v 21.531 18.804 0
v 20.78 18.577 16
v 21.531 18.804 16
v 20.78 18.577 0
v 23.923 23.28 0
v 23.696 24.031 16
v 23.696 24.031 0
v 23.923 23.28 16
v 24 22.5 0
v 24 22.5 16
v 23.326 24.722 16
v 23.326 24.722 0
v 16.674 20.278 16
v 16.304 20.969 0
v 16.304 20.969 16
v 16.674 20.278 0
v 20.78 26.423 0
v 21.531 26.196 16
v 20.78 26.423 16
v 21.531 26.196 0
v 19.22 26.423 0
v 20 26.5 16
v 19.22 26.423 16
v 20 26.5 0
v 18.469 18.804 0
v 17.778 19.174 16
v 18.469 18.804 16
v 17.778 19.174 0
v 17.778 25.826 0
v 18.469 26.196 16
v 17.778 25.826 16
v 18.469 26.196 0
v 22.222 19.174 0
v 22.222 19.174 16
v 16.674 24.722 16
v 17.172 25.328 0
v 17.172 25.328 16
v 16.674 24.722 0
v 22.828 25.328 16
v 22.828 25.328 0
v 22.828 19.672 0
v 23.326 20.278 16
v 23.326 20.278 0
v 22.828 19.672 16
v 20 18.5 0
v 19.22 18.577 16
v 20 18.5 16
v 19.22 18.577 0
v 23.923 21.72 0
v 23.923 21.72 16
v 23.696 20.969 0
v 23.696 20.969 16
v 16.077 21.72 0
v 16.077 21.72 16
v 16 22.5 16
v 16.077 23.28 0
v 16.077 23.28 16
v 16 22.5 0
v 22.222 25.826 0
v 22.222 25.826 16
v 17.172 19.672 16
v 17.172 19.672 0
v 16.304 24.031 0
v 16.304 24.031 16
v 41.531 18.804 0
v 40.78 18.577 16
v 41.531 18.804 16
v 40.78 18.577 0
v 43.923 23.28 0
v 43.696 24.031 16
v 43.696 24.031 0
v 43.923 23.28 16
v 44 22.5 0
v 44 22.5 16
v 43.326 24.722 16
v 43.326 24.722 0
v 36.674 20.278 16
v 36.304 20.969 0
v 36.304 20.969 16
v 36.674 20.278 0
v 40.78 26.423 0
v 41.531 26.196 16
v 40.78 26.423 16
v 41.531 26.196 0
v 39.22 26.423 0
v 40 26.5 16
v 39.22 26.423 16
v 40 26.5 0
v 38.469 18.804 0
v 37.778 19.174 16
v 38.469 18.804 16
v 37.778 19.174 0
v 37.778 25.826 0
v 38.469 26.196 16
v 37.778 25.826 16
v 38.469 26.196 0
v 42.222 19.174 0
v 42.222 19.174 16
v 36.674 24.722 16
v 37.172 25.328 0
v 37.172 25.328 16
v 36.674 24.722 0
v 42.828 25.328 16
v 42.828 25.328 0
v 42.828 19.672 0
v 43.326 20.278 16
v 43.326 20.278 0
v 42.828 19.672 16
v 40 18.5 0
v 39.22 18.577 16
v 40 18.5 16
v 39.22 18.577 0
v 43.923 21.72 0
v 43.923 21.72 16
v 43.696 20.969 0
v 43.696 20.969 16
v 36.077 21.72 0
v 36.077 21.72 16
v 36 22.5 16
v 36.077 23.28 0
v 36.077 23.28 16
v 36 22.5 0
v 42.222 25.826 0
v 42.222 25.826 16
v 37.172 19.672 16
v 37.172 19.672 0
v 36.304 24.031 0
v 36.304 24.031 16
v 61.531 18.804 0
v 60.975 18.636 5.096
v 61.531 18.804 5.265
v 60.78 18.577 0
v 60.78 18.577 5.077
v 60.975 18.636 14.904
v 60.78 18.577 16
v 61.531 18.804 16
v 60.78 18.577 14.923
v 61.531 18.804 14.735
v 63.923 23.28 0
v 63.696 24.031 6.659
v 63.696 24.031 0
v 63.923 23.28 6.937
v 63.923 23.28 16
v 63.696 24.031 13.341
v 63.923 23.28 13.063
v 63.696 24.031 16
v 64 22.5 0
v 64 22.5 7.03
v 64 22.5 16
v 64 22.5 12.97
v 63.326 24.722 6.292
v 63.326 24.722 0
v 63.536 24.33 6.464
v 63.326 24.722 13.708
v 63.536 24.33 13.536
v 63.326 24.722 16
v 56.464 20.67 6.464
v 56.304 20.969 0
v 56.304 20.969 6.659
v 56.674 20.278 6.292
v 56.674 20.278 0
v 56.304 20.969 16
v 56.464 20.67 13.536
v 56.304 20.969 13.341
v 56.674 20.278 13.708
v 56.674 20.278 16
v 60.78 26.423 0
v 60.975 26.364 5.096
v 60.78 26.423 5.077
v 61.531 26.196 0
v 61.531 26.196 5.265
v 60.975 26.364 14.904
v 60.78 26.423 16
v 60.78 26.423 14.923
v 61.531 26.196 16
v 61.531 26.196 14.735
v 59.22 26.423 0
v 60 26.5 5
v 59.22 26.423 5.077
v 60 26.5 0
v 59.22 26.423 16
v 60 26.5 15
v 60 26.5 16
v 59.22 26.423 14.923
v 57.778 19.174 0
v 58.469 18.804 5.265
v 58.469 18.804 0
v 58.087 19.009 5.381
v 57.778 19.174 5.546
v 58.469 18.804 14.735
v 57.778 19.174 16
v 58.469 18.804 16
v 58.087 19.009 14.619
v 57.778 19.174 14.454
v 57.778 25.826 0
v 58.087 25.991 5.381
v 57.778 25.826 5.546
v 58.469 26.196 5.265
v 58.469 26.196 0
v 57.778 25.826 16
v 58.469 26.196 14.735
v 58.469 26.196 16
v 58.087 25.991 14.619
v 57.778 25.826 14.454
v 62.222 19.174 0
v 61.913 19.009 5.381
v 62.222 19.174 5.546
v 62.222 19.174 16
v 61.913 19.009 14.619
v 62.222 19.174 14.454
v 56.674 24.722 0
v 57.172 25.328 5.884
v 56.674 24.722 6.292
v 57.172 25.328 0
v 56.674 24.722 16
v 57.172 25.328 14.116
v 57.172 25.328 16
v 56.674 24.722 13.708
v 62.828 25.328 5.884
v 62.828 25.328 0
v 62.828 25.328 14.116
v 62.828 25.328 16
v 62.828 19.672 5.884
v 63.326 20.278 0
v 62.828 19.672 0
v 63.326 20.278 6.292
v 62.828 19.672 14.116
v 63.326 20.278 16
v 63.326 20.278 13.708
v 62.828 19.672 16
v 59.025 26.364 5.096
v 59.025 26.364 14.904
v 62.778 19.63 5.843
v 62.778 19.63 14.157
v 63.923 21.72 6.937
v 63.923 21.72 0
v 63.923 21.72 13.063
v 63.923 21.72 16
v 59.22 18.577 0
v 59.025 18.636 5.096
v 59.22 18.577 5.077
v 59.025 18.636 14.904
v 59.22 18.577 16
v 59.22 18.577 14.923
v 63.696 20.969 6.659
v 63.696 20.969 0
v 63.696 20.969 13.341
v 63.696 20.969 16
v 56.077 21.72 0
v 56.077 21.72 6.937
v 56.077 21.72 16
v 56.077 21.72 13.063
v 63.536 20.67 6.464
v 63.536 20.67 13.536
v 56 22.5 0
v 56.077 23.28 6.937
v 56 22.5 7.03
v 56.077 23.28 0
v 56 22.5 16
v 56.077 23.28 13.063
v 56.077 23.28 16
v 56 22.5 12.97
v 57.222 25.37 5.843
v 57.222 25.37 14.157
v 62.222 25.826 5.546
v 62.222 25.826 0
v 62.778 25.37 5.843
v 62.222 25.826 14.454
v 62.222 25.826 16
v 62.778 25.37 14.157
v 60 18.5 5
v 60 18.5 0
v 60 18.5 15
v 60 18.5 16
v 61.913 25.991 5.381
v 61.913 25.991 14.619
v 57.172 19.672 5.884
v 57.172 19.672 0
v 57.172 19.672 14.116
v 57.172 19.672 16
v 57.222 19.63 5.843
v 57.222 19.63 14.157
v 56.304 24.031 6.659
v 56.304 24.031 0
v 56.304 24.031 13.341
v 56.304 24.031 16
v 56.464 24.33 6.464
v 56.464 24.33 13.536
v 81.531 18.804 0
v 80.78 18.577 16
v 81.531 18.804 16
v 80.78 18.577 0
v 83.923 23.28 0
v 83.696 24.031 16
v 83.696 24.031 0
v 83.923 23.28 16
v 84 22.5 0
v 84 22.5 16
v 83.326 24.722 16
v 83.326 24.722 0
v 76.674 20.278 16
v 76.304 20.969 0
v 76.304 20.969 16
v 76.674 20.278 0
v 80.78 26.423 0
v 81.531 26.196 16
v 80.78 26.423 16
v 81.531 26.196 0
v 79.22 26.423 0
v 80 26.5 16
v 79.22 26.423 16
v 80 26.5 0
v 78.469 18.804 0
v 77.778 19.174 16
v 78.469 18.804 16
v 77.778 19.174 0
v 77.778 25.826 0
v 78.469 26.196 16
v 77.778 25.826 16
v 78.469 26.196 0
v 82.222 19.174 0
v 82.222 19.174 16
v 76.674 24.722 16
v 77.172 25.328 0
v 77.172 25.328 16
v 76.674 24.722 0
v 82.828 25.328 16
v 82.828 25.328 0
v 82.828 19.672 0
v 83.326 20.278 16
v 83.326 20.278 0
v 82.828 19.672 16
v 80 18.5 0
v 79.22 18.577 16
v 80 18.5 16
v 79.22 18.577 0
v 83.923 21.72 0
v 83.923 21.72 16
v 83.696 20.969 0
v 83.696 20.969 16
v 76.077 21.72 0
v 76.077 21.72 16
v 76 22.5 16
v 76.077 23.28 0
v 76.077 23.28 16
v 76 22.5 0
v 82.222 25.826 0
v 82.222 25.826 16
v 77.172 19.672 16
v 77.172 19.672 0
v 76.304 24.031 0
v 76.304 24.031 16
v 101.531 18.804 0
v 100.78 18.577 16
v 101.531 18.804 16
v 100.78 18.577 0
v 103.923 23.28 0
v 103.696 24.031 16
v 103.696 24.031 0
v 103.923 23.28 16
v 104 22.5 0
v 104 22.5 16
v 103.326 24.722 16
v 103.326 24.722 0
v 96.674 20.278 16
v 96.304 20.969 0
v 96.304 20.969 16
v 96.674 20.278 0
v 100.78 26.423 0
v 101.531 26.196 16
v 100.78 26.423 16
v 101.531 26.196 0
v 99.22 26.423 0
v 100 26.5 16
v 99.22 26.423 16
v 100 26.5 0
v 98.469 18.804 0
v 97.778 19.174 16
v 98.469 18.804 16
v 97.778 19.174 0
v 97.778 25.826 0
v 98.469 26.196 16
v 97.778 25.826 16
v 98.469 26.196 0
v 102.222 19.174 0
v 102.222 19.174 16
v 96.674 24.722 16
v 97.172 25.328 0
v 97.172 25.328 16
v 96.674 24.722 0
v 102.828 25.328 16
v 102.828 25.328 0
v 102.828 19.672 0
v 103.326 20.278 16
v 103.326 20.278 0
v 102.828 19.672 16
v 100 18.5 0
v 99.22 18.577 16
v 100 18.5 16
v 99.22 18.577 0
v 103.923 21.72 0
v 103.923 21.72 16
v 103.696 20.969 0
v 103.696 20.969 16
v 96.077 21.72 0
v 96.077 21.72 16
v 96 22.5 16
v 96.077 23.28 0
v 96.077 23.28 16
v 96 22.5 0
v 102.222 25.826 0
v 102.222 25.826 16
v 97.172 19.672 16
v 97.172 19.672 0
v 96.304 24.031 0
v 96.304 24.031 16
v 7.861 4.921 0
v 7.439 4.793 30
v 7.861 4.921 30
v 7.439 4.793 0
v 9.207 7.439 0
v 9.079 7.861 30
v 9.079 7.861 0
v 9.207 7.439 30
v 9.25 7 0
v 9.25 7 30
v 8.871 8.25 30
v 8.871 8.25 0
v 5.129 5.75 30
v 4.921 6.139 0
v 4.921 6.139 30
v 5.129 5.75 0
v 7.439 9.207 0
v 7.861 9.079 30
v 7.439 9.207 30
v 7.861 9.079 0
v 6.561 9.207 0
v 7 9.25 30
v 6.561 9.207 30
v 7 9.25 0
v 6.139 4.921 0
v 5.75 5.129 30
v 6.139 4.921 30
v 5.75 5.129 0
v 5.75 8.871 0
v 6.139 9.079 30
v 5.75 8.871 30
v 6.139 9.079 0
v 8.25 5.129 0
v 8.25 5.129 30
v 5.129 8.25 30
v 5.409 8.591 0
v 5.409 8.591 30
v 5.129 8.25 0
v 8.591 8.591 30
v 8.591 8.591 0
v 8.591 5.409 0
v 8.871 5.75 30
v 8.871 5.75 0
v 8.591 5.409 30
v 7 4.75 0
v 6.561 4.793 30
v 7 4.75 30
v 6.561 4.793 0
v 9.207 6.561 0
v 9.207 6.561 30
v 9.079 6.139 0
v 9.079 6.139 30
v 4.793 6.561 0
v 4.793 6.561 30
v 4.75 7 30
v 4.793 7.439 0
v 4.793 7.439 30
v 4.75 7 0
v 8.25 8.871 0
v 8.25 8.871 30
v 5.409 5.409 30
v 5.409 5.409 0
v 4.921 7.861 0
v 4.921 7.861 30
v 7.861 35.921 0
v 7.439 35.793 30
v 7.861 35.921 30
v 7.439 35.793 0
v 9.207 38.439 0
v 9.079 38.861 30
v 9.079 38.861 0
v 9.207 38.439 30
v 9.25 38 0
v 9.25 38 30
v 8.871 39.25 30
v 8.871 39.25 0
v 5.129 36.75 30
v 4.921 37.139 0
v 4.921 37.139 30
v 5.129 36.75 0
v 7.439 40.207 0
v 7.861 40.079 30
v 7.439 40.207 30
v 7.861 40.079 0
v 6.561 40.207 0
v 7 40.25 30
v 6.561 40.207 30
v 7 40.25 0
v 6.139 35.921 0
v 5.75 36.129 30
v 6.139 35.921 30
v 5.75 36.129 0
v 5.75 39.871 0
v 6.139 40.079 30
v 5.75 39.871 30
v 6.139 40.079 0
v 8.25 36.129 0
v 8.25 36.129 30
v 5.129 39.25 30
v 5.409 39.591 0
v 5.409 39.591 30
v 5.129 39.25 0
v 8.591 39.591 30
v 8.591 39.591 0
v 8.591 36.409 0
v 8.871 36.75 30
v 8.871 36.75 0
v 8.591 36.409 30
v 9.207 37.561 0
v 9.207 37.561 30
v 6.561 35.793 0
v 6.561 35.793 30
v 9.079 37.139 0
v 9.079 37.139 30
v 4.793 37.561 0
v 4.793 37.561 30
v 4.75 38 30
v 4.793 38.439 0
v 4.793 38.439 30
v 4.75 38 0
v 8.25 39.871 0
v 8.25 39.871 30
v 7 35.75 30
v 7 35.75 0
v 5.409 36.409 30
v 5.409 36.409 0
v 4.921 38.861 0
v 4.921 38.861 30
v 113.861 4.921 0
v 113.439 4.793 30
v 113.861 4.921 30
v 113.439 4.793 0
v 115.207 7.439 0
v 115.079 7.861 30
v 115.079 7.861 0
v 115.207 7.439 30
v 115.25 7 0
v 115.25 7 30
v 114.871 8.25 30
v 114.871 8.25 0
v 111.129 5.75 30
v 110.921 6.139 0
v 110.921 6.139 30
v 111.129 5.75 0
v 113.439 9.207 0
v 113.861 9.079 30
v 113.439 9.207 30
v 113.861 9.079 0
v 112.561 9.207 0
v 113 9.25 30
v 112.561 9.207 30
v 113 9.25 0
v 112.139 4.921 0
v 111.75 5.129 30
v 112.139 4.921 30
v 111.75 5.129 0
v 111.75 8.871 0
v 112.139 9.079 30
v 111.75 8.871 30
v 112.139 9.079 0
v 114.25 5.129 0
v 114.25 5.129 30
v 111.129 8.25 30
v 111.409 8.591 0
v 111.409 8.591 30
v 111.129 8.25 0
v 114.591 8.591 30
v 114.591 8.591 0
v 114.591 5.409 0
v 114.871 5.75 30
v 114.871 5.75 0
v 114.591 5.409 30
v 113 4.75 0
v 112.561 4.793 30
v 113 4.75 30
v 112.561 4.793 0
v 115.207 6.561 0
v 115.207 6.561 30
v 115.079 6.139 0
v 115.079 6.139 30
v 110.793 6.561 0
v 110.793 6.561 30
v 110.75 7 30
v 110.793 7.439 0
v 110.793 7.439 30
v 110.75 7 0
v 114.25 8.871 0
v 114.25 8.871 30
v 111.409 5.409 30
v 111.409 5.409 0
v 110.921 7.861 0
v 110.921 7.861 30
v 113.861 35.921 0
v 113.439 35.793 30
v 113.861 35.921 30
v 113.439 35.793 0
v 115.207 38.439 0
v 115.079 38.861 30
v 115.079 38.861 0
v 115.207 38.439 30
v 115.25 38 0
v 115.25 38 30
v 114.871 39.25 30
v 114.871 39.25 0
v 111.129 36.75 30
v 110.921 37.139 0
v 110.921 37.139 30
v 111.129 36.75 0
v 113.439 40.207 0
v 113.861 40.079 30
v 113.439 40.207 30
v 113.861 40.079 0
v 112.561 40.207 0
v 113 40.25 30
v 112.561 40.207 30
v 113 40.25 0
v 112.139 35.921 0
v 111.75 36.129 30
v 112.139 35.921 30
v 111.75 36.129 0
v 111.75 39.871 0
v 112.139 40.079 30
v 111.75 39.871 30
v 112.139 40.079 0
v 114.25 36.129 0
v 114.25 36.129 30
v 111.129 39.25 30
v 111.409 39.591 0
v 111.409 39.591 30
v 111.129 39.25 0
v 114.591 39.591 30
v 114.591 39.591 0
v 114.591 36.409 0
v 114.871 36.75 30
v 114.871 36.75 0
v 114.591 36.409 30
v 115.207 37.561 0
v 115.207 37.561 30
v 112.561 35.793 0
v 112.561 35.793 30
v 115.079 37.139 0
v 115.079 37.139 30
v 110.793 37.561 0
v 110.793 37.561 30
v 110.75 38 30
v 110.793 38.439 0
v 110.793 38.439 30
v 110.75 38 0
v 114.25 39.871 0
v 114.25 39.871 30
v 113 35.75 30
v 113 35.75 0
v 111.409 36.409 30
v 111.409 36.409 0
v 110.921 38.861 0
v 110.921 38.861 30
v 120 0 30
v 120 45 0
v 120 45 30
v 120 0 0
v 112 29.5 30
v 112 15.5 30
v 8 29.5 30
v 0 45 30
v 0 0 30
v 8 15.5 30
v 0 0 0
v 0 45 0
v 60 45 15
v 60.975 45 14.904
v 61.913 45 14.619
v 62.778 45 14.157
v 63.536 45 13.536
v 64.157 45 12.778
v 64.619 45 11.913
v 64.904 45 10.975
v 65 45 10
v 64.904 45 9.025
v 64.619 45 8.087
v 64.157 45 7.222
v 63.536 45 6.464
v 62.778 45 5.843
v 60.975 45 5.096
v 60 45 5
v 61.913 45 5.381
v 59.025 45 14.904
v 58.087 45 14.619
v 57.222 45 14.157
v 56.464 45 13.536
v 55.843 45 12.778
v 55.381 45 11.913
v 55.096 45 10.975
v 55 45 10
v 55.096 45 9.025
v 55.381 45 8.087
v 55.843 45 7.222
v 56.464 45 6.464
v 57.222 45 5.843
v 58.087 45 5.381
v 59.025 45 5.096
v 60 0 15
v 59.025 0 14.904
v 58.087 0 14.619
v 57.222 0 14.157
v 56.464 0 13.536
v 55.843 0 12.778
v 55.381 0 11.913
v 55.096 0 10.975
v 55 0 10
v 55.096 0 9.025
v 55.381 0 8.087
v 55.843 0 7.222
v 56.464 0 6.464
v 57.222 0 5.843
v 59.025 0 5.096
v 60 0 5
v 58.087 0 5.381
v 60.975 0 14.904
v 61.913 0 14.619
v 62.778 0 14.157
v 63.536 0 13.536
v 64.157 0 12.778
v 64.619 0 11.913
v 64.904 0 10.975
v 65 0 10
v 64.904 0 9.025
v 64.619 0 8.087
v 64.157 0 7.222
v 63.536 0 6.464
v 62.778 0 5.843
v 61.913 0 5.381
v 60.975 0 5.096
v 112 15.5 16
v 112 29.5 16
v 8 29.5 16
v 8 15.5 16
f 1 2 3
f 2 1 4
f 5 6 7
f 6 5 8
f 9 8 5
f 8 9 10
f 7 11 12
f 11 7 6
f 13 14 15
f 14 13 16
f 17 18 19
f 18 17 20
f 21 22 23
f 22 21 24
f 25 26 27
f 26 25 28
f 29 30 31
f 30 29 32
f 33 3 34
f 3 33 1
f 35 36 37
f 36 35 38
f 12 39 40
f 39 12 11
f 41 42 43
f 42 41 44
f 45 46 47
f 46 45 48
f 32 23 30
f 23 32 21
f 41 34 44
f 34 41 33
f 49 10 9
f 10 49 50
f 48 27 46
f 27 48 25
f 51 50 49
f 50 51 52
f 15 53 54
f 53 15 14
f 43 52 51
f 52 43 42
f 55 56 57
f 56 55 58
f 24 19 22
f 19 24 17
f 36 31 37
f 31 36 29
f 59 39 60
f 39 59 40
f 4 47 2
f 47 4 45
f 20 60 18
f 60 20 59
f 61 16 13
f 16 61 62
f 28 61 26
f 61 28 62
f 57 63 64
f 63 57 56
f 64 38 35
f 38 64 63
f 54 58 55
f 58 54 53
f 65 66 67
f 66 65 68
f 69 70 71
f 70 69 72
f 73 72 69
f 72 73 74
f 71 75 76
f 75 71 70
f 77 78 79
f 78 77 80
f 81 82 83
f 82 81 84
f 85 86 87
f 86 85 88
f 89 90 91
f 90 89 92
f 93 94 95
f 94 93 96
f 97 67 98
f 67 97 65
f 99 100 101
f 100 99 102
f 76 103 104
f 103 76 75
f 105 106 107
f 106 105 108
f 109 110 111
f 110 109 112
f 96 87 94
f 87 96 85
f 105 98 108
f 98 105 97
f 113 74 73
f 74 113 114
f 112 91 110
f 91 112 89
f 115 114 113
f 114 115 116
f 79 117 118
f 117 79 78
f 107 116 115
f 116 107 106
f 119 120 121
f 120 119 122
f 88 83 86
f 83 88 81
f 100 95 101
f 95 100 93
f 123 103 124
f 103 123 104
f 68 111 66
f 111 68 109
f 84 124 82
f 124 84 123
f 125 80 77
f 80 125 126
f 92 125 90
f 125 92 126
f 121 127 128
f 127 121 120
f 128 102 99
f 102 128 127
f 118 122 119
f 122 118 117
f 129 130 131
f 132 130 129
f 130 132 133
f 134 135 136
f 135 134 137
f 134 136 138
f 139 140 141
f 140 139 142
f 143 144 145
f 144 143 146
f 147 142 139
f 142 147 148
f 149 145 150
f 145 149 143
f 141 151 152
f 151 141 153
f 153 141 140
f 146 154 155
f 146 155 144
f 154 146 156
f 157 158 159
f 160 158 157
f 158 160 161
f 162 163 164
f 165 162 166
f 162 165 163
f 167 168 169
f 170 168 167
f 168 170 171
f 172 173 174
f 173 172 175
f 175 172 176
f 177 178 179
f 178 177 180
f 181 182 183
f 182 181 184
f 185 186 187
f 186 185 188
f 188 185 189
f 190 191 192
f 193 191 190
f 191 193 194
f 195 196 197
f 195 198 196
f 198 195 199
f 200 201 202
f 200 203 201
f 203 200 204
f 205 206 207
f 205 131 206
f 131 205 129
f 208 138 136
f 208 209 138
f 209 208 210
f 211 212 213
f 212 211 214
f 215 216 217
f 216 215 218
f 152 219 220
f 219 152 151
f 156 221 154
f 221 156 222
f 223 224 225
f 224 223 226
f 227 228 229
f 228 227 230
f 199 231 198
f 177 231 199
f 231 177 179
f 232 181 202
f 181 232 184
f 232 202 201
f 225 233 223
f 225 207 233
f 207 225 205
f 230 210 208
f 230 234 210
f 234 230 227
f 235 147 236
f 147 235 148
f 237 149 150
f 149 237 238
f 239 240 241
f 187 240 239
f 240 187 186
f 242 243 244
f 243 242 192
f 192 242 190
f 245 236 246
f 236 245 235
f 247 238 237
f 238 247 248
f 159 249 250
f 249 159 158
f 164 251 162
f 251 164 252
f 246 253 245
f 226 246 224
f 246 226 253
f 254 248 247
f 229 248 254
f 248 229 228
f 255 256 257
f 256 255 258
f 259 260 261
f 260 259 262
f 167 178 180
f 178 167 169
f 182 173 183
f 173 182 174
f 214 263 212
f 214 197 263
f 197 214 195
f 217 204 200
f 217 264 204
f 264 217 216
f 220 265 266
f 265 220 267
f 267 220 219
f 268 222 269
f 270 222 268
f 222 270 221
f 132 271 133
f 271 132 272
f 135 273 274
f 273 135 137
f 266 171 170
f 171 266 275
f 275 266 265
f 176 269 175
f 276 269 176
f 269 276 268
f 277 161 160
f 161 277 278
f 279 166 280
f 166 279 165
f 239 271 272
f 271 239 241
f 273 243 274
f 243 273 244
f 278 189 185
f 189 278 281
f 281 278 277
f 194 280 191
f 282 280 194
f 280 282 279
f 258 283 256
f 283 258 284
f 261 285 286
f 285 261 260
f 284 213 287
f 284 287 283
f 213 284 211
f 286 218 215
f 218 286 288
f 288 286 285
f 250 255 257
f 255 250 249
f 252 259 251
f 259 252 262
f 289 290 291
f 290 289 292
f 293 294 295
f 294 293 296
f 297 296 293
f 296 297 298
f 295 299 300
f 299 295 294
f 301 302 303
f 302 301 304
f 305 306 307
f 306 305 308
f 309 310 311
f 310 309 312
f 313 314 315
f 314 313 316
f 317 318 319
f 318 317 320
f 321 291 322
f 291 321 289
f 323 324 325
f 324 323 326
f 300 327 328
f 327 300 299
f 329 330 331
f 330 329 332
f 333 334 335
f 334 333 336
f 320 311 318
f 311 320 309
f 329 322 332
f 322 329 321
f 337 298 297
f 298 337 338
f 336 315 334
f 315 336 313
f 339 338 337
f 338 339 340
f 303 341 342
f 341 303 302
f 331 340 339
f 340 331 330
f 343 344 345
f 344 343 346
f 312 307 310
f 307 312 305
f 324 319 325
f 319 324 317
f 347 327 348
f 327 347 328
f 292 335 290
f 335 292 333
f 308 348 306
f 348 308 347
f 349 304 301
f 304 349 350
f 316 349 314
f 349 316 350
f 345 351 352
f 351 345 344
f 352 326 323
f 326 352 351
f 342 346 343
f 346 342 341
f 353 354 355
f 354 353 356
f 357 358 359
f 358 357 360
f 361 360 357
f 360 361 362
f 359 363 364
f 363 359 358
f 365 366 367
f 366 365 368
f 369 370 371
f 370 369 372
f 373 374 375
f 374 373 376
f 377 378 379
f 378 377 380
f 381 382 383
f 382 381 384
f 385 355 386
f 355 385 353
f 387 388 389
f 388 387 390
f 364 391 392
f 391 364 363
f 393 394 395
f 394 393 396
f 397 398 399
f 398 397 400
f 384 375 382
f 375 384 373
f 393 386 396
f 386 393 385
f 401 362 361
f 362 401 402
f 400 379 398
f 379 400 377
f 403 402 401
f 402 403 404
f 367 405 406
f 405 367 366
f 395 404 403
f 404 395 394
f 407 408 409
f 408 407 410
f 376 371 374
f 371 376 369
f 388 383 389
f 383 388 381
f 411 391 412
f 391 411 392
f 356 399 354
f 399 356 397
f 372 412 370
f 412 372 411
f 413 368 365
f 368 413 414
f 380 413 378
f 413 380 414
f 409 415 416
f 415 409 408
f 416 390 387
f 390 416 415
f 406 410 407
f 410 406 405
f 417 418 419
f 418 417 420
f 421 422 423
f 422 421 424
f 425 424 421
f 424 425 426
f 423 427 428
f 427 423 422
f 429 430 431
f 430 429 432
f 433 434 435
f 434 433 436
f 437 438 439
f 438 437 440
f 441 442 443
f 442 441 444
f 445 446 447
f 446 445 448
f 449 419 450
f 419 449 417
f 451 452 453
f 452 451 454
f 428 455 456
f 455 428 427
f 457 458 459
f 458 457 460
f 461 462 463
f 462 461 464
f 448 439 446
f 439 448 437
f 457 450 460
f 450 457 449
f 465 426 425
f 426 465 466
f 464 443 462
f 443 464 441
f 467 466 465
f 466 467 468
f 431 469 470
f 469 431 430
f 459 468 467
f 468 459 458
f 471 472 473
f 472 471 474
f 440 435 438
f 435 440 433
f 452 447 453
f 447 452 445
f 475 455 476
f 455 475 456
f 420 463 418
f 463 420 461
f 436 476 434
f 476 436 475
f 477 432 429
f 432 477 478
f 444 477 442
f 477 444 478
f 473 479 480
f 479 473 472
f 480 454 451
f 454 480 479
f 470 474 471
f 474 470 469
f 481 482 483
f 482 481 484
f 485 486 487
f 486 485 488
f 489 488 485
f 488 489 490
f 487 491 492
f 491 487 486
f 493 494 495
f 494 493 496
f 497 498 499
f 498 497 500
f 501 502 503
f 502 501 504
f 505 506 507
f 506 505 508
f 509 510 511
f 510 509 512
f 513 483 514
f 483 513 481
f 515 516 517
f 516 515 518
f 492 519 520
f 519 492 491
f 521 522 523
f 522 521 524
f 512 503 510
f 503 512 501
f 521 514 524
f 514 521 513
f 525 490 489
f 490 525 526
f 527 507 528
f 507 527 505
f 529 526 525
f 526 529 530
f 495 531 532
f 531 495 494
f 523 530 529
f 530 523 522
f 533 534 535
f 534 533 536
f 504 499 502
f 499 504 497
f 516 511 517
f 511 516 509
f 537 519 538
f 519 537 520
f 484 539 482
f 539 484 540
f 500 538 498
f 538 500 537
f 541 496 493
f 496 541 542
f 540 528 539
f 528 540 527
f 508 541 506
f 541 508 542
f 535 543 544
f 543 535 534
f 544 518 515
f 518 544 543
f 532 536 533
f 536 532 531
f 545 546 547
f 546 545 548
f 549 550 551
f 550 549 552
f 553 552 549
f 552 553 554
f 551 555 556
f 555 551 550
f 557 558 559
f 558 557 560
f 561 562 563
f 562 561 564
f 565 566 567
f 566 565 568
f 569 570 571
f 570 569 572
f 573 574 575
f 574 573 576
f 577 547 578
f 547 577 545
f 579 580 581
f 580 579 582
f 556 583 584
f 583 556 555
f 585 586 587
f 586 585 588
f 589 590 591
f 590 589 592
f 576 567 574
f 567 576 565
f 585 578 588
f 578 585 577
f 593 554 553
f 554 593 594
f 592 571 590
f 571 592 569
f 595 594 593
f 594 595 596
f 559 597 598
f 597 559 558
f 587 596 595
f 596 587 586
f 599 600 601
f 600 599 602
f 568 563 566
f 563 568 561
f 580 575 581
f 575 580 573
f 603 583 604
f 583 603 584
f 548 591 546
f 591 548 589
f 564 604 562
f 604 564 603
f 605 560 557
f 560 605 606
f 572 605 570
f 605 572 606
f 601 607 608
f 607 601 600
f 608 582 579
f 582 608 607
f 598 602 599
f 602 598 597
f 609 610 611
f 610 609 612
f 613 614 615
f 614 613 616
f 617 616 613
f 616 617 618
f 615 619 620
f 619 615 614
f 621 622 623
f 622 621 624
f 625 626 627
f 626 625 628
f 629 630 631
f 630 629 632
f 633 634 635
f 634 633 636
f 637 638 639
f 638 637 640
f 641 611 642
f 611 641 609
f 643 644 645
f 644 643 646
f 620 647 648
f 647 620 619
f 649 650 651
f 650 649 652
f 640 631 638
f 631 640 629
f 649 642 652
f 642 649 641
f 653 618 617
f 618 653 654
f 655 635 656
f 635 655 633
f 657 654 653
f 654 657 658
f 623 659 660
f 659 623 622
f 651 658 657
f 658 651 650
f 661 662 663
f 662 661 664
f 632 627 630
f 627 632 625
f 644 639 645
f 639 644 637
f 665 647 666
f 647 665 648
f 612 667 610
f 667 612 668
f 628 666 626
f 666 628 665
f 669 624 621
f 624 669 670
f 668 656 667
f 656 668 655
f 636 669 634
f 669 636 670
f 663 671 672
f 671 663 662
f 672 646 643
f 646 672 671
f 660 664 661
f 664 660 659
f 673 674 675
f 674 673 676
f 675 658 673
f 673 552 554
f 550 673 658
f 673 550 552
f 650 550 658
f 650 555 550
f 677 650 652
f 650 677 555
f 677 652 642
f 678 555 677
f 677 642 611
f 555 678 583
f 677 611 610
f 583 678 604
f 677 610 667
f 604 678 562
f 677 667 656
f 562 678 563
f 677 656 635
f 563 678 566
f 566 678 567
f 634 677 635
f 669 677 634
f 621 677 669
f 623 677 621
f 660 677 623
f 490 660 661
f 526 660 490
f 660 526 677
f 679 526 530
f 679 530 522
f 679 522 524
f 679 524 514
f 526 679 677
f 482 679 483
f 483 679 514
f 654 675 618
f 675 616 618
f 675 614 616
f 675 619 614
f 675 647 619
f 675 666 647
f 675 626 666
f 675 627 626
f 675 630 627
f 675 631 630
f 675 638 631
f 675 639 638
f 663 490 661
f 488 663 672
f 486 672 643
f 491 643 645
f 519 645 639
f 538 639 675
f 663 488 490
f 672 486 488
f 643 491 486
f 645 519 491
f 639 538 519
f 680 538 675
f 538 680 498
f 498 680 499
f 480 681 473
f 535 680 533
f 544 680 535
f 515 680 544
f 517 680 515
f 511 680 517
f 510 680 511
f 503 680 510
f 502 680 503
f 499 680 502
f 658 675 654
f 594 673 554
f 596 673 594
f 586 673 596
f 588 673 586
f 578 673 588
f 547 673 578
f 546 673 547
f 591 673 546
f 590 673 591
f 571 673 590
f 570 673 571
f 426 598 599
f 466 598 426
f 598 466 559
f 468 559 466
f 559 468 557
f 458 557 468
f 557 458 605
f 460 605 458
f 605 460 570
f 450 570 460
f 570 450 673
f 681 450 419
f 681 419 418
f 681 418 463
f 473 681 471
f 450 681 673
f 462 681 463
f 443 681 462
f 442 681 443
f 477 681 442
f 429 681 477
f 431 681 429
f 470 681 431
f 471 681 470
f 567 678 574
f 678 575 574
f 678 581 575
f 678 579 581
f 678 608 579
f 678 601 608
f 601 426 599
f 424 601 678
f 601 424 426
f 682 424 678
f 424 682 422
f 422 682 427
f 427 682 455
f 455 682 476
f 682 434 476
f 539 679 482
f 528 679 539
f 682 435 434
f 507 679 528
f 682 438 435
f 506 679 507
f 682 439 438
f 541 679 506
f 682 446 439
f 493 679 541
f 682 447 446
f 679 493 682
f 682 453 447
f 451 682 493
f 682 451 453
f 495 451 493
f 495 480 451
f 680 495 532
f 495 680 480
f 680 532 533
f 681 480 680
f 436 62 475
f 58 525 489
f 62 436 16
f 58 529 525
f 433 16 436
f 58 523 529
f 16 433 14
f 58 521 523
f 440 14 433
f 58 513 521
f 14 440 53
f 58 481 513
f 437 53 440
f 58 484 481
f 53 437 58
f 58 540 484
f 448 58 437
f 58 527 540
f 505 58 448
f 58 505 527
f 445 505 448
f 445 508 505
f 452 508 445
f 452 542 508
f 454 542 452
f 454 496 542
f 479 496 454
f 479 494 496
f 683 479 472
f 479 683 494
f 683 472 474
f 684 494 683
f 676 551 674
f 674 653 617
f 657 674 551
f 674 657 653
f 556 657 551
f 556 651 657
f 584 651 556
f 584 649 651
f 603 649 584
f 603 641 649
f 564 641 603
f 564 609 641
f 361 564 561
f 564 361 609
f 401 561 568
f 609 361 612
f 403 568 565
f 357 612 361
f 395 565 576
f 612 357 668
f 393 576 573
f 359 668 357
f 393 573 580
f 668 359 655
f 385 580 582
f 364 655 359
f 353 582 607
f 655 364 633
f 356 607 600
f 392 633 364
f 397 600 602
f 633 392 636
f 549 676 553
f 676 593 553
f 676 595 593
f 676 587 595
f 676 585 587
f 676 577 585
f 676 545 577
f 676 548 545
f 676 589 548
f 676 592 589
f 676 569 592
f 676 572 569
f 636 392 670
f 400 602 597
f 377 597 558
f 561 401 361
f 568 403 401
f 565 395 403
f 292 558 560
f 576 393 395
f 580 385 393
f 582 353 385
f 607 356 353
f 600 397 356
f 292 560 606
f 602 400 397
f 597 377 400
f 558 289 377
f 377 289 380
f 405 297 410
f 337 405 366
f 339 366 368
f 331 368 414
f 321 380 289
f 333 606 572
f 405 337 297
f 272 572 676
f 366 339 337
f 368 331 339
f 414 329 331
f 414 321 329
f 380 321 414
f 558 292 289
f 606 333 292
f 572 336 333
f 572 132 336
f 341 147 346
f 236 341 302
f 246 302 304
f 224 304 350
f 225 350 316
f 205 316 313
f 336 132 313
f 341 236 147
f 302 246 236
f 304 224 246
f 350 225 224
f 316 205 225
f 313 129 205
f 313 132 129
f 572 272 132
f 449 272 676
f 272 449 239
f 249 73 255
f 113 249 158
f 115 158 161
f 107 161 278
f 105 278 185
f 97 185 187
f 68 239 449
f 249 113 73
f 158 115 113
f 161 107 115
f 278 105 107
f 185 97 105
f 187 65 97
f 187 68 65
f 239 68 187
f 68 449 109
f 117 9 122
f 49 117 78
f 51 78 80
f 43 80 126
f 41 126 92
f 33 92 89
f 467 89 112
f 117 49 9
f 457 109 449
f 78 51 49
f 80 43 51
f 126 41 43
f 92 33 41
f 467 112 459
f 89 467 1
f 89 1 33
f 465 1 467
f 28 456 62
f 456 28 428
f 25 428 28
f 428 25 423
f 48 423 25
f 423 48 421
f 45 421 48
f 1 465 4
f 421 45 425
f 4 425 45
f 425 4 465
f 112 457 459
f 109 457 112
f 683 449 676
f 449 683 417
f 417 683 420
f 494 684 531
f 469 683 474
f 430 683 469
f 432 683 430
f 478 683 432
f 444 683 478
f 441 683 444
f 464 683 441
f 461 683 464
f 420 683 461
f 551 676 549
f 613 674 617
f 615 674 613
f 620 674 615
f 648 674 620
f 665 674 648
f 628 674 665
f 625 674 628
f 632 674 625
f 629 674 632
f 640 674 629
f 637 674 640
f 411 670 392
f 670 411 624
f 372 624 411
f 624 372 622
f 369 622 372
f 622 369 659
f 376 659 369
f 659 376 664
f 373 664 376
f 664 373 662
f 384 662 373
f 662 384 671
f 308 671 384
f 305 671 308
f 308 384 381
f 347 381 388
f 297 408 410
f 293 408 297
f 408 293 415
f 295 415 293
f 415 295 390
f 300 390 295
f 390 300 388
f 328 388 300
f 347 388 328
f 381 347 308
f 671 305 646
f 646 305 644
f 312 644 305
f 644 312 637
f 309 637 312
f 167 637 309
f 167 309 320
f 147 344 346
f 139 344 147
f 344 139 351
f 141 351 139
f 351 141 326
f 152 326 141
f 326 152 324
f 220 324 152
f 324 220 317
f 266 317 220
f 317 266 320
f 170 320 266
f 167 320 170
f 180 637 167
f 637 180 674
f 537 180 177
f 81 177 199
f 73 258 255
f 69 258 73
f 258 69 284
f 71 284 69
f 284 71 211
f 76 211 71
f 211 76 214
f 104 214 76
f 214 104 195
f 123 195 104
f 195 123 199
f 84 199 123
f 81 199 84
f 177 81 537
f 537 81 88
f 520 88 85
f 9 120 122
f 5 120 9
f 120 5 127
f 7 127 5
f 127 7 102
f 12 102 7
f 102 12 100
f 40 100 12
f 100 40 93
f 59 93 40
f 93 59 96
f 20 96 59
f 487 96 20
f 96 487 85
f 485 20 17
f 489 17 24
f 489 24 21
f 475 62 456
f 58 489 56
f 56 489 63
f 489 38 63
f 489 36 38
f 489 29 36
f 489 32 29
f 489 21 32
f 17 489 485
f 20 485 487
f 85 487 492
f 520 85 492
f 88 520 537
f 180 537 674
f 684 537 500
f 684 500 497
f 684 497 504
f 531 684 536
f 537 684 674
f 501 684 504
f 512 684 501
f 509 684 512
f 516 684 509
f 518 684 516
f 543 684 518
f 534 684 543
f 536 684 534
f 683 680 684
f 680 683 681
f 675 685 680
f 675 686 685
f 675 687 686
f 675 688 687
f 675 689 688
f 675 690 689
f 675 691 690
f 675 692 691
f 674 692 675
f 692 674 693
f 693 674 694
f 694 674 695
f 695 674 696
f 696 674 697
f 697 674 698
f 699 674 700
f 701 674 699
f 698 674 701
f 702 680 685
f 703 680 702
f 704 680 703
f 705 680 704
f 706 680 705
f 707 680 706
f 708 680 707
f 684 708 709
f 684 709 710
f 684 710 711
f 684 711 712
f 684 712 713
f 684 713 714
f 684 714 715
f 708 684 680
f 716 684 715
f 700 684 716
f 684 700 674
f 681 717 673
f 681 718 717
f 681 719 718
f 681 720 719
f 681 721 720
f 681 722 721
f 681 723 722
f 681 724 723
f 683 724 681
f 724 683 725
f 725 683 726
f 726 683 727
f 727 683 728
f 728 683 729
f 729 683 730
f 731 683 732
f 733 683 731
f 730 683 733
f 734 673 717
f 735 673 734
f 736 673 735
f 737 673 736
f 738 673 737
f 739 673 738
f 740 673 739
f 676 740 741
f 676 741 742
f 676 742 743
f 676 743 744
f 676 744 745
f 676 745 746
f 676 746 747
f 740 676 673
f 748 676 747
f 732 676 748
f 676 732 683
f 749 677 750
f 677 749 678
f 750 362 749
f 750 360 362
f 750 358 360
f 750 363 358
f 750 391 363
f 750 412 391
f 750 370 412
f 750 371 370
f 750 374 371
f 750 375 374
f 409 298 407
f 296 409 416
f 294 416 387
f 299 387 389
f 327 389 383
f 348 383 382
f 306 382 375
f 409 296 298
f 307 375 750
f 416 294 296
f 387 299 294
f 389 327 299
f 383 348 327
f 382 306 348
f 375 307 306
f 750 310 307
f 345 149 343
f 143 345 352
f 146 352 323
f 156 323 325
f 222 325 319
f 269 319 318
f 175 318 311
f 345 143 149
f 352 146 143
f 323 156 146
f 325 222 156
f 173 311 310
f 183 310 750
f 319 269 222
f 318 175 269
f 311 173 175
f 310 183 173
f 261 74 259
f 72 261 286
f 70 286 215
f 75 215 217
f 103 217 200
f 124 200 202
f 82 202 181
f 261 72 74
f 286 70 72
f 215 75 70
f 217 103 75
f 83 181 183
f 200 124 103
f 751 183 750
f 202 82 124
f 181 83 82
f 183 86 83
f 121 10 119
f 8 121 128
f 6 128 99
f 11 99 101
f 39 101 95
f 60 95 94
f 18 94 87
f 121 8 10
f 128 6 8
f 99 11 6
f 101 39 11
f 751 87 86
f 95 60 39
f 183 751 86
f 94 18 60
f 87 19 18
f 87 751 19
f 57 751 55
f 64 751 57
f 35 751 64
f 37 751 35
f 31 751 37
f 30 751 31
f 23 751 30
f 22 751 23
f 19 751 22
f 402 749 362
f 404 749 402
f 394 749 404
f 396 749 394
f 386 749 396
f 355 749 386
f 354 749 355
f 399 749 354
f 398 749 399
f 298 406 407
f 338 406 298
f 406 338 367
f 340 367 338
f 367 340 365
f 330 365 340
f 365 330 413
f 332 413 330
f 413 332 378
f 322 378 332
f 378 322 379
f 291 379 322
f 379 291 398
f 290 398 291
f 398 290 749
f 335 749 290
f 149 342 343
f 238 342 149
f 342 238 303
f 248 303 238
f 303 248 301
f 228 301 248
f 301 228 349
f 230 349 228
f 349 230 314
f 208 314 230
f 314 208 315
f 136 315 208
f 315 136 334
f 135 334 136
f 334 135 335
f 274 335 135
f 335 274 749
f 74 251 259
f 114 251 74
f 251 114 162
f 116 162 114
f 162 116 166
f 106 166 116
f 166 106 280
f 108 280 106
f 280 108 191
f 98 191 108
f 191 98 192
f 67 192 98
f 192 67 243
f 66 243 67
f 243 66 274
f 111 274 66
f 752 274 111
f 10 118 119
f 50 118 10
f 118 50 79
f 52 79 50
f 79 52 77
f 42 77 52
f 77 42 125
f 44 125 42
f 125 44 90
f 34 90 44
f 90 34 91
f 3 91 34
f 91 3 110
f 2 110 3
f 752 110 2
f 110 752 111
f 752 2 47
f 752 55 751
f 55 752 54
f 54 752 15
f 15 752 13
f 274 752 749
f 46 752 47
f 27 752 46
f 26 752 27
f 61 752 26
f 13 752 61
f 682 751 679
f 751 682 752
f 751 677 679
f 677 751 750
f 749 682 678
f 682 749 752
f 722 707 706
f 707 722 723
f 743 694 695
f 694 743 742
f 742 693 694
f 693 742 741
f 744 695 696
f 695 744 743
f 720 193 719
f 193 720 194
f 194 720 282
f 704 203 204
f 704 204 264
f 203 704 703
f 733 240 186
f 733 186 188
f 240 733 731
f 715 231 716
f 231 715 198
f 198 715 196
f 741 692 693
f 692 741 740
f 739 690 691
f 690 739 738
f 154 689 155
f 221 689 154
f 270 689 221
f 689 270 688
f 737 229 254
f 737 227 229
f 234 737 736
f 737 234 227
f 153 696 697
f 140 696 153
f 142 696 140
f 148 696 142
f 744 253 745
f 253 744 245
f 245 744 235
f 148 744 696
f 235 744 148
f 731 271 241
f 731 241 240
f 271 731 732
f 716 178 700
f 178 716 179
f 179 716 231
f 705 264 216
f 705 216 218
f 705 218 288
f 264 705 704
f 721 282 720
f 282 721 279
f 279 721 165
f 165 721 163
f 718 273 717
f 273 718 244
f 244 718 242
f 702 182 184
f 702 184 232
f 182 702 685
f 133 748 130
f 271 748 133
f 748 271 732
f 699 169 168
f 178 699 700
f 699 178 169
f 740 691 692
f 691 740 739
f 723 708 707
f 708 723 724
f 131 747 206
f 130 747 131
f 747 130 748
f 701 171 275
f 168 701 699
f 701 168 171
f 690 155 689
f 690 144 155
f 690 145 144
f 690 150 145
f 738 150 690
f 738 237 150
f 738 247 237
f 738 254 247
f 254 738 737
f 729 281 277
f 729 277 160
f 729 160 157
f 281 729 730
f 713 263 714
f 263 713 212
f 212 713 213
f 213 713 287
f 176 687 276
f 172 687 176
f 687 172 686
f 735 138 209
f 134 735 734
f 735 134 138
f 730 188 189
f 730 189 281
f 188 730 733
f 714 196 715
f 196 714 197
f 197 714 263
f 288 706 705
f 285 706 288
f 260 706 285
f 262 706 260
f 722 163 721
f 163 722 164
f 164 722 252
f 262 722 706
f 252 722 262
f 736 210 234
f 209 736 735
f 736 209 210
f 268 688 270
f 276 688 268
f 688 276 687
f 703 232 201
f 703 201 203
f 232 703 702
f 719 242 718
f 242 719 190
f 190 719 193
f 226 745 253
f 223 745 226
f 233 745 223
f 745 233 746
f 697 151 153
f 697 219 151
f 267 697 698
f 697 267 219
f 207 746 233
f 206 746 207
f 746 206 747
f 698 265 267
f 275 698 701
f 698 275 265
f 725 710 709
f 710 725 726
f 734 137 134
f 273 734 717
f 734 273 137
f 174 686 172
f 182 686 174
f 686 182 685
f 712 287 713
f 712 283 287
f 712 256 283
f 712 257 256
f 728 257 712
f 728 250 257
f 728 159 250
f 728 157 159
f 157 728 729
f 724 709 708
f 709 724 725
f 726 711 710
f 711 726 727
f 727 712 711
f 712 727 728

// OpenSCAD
$fn = 32;

// ----------------------------------------------------------------------
// Manifold block: side_outlet manifold
// ----------------------------------------------------------------------

// --- parameters (mm) ---
block_l = 120;            // block length, X
block_w = 45;             // block width, Y
block_h = 30;             // block height, Z
port_d = 8;               // port bore diameter
port_pitch = 20;          // port pitch along X
gallery_d = 14;           // top gallery width, Y
gallery_depth = 14;       // gallery pocket depth
wall_p = 8;               // gallery end wall thickness, X
mnt_d = 4.5;              // mounting hole diameter
mnt_in = 7;               // mounting hole inset from the edges
out_d = 10;               // outlet bore diameter
out_z = 10;               // outlet axis height

n_ports = 5;  // ports in the row
port_x0 = (block_l - (n_ports - 1) * port_pitch) / 2;  // first port X

difference() {
  cube([block_l, block_w, block_h]);
  for (i = [0 : n_ports - 1])
    translate([port_x0 + i * port_pitch, block_w / 2, -1])
      cylinder(h = block_h + 2, d = port_d);
  translate([wall_p, block_w / 2 - gallery_d / 2, block_h - gallery_depth])
    cube([block_l - 2 * wall_p, gallery_d, gallery_depth + 1]);
  for (cx = [mnt_in, block_l - mnt_in])
    for (cy = [mnt_in, block_w - mnt_in])
      translate([cx, cy, -1]) cylinder(h = block_h + 2, d = mnt_d);
  translate([block_l / 2, -1, out_z]) rotate([-90, 0, 0])
    cylinder(h = block_w + 2, d = out_d);
}
